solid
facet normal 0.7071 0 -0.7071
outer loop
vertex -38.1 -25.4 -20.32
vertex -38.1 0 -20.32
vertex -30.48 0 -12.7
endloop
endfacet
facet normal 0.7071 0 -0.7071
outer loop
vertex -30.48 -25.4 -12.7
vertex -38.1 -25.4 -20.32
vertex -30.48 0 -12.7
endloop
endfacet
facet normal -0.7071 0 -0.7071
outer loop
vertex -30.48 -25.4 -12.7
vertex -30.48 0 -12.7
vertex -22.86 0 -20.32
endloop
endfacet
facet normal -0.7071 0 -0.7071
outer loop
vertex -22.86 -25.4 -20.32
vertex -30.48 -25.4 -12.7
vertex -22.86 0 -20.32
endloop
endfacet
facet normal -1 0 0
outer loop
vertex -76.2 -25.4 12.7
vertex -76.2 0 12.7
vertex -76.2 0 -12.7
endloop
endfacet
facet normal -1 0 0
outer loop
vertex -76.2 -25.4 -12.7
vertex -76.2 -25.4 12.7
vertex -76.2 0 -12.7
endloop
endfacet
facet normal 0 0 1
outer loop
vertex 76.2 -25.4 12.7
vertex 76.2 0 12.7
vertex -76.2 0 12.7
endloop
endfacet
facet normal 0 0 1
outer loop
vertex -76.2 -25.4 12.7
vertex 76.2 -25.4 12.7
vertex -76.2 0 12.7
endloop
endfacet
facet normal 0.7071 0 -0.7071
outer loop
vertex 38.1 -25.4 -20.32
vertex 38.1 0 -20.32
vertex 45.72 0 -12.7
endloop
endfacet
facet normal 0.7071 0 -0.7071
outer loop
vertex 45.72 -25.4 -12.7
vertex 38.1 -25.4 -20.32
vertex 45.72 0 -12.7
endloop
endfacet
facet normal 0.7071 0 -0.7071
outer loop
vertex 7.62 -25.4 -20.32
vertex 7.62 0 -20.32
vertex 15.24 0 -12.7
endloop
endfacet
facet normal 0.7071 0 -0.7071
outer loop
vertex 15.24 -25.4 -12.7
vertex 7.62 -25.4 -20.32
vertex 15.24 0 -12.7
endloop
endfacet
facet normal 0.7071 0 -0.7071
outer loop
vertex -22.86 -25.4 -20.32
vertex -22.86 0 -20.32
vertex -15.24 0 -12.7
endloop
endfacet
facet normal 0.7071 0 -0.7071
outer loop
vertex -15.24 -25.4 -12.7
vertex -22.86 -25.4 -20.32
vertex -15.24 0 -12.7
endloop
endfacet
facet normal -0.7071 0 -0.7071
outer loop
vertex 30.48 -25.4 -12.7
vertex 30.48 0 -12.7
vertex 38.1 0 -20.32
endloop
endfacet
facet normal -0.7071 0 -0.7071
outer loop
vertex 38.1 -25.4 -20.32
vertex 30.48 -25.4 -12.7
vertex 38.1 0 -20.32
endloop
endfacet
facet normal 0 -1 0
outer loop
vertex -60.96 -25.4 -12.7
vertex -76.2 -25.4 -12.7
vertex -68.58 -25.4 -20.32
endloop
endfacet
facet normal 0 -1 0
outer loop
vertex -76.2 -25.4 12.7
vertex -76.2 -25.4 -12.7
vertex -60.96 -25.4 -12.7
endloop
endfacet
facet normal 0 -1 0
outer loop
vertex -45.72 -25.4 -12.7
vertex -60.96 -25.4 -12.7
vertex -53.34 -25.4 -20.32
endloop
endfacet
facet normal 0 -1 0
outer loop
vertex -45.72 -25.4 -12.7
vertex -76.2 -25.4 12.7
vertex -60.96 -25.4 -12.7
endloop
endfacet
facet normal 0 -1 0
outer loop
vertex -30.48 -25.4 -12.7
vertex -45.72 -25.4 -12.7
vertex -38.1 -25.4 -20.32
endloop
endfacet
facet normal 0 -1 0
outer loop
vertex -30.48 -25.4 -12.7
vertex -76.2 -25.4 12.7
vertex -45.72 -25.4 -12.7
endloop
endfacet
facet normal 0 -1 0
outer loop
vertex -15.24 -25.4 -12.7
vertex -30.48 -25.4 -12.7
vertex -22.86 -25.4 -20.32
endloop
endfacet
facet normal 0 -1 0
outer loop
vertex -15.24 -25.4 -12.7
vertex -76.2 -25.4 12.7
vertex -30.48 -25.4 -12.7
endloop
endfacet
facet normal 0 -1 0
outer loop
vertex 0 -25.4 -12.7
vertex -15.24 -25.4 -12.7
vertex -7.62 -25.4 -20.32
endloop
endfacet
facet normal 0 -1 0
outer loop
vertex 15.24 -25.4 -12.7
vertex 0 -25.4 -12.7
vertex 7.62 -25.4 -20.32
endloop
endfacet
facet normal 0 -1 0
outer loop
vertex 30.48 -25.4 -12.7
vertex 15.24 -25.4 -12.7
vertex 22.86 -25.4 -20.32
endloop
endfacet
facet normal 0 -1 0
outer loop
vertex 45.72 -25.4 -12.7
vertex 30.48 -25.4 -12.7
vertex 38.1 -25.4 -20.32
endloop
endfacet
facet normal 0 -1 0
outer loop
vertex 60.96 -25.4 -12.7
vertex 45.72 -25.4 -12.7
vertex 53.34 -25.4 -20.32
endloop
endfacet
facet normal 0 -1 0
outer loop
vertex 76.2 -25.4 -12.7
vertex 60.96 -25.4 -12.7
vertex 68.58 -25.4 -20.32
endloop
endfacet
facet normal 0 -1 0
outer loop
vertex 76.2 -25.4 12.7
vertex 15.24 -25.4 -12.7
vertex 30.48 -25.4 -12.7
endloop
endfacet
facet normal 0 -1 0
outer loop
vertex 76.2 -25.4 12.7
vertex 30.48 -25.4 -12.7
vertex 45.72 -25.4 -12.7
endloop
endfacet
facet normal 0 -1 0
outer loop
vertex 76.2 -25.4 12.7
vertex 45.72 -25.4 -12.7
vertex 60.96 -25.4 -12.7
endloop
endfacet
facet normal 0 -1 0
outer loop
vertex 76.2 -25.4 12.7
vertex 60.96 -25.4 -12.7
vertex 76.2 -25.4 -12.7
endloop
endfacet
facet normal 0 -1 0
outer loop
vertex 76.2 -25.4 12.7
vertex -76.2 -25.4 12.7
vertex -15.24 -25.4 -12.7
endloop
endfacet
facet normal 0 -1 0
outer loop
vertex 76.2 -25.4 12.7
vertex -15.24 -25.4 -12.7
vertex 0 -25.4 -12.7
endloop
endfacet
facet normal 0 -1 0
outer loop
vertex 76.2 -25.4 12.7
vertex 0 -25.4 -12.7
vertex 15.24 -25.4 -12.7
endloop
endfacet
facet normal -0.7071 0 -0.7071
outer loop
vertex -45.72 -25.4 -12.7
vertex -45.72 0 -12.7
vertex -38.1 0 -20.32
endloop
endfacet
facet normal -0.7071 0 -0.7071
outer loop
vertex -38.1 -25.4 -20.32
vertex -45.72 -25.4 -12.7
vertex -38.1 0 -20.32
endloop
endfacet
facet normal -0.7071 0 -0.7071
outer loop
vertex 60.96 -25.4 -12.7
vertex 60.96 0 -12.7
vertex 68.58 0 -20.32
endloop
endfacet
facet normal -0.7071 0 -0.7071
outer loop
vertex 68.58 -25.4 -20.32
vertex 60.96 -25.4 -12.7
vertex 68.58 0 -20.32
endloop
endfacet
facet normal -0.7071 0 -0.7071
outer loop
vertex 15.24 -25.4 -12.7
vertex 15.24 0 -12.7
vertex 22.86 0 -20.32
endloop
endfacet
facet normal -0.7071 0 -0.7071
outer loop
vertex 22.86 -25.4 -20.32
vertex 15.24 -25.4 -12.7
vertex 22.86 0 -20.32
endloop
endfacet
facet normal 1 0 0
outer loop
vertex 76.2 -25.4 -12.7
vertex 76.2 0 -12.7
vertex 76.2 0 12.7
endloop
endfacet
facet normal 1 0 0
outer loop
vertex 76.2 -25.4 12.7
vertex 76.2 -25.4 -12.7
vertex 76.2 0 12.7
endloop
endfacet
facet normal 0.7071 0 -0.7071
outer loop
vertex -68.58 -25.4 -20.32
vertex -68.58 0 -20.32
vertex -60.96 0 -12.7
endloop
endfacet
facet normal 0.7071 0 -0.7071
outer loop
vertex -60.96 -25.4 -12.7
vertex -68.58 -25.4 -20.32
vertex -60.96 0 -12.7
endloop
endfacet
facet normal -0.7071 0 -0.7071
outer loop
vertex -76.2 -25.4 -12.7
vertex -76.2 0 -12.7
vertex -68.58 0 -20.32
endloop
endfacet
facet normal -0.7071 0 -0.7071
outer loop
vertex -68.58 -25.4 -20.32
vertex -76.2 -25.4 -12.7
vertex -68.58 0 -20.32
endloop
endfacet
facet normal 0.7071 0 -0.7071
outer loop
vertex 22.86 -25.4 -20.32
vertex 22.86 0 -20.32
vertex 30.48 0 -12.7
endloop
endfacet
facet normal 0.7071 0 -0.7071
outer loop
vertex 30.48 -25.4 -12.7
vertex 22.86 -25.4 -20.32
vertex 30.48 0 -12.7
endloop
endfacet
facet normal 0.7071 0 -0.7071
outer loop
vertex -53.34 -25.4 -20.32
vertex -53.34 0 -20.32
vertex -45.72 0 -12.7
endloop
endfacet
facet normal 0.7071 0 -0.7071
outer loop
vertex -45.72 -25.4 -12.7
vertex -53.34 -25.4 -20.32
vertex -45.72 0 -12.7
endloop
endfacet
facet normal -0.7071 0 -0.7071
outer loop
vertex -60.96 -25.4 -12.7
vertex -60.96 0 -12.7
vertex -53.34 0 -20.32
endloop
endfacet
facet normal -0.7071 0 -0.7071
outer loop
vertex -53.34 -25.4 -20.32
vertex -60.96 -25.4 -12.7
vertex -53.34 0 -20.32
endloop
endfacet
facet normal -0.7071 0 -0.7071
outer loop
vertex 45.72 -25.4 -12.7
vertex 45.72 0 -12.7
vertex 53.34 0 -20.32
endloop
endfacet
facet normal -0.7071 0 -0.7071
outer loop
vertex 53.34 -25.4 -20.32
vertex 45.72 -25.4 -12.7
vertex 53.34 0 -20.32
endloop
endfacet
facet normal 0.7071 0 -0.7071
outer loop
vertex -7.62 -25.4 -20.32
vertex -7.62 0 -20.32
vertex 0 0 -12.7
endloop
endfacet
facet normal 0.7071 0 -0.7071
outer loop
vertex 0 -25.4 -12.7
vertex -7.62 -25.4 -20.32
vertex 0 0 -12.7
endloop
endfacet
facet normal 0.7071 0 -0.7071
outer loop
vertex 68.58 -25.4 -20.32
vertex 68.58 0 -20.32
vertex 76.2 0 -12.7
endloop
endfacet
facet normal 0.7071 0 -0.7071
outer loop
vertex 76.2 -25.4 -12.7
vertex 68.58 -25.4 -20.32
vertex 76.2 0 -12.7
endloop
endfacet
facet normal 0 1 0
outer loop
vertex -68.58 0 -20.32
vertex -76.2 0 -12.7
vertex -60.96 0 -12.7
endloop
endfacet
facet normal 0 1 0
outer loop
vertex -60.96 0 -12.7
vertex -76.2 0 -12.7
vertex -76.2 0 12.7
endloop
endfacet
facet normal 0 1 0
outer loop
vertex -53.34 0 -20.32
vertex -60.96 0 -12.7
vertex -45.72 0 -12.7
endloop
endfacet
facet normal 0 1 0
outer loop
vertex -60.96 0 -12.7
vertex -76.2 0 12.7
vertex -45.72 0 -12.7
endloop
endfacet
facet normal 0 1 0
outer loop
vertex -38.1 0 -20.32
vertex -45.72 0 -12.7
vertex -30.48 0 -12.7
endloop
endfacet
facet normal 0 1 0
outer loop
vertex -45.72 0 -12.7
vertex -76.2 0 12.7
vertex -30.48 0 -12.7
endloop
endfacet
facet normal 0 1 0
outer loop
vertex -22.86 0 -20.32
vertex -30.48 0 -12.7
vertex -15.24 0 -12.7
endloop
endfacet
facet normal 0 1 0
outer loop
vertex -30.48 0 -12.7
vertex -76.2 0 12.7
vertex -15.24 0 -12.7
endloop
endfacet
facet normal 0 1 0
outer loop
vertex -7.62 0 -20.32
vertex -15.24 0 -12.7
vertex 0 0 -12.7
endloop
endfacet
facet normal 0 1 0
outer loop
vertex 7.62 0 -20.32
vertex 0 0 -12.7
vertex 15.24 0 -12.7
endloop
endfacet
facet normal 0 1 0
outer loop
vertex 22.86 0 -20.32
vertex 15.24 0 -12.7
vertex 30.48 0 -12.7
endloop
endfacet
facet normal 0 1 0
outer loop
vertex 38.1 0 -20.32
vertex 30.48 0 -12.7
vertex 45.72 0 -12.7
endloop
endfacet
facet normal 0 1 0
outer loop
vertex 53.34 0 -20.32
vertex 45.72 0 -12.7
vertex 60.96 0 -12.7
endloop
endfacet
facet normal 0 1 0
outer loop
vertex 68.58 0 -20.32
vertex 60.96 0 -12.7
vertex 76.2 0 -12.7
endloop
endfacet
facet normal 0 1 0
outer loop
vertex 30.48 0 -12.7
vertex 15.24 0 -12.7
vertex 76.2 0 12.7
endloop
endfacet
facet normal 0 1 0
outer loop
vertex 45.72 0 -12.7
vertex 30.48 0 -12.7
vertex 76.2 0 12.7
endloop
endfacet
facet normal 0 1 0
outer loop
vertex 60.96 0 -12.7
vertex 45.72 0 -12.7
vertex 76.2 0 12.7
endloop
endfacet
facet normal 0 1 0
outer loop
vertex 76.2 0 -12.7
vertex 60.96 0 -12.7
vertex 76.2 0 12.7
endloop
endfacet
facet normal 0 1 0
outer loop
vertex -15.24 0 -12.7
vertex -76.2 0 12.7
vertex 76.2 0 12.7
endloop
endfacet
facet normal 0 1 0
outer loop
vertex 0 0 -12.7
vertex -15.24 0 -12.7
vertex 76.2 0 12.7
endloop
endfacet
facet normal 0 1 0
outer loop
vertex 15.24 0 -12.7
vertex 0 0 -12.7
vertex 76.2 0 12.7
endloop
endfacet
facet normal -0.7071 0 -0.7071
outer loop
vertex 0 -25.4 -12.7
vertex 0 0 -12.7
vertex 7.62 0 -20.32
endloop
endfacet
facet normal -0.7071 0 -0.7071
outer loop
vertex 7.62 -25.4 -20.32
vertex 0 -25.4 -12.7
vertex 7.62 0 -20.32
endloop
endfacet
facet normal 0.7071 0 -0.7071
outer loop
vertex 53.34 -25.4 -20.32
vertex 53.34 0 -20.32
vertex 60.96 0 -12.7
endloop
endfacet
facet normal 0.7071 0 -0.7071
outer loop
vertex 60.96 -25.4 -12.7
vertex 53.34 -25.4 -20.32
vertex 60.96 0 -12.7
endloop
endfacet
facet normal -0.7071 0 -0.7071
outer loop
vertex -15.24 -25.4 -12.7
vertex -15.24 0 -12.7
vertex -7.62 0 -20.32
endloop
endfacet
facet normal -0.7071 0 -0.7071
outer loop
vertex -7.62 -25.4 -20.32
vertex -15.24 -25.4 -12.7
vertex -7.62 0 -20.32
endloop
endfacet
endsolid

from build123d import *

# Parameters (mm, degrees)
F1_DEPTH = 25.4


with BuildPart() as f1:
    # F0 (on Front) → F1 (new body)
    with BuildSketch(Plane.XZ):
        Polygon((68.58, -20.32), (76.2, -12.7), (60.96, -12.7), align=None)
        Polygon((60.96, -12.7), (76.2, -12.7), (76.2, 12.7), (-76.2, 12.7), (-76.2, -12.7), (-60.96, -12.7), (-45.72, -12.7), (-30.48, -12.7), (-15.24, -12.7), (0, -12.7), (15.24, -12.7), (30.48, -12.7), (45.72, -12.7), align=None)
        Polygon((53.34, -20.32), (60.96, -12.7), (45.72, -12.7), align=None)
        Polygon((38.1, -20.32), (45.72, -12.7), (30.48, -12.7), align=None)
        Polygon((22.86, -20.32), (30.48, -12.7), (15.24, -12.7), align=None)
        Polygon((-60.96, -12.7), (-76.2, -12.7), (-68.58, -20.32), align=None)
        Polygon((7.62, -20.32), (15.24, -12.7), (0, -12.7), align=None)
        Polygon((-45.72, -12.7), (-60.96, -12.7), (-53.34, -20.32), align=None)
        Polygon((-7.62, -20.32), (0, -12.7), (-15.24, -12.7), align=None)
        Polygon((-30.48, -12.7), (-45.72, -12.7), (-38.1, -20.32), align=None)
        Polygon((-22.86, -20.32), (-15.24, -12.7), (-30.48, -12.7), align=None)
    extrude(amount=F1_DEPTH)


solid = f1.part
